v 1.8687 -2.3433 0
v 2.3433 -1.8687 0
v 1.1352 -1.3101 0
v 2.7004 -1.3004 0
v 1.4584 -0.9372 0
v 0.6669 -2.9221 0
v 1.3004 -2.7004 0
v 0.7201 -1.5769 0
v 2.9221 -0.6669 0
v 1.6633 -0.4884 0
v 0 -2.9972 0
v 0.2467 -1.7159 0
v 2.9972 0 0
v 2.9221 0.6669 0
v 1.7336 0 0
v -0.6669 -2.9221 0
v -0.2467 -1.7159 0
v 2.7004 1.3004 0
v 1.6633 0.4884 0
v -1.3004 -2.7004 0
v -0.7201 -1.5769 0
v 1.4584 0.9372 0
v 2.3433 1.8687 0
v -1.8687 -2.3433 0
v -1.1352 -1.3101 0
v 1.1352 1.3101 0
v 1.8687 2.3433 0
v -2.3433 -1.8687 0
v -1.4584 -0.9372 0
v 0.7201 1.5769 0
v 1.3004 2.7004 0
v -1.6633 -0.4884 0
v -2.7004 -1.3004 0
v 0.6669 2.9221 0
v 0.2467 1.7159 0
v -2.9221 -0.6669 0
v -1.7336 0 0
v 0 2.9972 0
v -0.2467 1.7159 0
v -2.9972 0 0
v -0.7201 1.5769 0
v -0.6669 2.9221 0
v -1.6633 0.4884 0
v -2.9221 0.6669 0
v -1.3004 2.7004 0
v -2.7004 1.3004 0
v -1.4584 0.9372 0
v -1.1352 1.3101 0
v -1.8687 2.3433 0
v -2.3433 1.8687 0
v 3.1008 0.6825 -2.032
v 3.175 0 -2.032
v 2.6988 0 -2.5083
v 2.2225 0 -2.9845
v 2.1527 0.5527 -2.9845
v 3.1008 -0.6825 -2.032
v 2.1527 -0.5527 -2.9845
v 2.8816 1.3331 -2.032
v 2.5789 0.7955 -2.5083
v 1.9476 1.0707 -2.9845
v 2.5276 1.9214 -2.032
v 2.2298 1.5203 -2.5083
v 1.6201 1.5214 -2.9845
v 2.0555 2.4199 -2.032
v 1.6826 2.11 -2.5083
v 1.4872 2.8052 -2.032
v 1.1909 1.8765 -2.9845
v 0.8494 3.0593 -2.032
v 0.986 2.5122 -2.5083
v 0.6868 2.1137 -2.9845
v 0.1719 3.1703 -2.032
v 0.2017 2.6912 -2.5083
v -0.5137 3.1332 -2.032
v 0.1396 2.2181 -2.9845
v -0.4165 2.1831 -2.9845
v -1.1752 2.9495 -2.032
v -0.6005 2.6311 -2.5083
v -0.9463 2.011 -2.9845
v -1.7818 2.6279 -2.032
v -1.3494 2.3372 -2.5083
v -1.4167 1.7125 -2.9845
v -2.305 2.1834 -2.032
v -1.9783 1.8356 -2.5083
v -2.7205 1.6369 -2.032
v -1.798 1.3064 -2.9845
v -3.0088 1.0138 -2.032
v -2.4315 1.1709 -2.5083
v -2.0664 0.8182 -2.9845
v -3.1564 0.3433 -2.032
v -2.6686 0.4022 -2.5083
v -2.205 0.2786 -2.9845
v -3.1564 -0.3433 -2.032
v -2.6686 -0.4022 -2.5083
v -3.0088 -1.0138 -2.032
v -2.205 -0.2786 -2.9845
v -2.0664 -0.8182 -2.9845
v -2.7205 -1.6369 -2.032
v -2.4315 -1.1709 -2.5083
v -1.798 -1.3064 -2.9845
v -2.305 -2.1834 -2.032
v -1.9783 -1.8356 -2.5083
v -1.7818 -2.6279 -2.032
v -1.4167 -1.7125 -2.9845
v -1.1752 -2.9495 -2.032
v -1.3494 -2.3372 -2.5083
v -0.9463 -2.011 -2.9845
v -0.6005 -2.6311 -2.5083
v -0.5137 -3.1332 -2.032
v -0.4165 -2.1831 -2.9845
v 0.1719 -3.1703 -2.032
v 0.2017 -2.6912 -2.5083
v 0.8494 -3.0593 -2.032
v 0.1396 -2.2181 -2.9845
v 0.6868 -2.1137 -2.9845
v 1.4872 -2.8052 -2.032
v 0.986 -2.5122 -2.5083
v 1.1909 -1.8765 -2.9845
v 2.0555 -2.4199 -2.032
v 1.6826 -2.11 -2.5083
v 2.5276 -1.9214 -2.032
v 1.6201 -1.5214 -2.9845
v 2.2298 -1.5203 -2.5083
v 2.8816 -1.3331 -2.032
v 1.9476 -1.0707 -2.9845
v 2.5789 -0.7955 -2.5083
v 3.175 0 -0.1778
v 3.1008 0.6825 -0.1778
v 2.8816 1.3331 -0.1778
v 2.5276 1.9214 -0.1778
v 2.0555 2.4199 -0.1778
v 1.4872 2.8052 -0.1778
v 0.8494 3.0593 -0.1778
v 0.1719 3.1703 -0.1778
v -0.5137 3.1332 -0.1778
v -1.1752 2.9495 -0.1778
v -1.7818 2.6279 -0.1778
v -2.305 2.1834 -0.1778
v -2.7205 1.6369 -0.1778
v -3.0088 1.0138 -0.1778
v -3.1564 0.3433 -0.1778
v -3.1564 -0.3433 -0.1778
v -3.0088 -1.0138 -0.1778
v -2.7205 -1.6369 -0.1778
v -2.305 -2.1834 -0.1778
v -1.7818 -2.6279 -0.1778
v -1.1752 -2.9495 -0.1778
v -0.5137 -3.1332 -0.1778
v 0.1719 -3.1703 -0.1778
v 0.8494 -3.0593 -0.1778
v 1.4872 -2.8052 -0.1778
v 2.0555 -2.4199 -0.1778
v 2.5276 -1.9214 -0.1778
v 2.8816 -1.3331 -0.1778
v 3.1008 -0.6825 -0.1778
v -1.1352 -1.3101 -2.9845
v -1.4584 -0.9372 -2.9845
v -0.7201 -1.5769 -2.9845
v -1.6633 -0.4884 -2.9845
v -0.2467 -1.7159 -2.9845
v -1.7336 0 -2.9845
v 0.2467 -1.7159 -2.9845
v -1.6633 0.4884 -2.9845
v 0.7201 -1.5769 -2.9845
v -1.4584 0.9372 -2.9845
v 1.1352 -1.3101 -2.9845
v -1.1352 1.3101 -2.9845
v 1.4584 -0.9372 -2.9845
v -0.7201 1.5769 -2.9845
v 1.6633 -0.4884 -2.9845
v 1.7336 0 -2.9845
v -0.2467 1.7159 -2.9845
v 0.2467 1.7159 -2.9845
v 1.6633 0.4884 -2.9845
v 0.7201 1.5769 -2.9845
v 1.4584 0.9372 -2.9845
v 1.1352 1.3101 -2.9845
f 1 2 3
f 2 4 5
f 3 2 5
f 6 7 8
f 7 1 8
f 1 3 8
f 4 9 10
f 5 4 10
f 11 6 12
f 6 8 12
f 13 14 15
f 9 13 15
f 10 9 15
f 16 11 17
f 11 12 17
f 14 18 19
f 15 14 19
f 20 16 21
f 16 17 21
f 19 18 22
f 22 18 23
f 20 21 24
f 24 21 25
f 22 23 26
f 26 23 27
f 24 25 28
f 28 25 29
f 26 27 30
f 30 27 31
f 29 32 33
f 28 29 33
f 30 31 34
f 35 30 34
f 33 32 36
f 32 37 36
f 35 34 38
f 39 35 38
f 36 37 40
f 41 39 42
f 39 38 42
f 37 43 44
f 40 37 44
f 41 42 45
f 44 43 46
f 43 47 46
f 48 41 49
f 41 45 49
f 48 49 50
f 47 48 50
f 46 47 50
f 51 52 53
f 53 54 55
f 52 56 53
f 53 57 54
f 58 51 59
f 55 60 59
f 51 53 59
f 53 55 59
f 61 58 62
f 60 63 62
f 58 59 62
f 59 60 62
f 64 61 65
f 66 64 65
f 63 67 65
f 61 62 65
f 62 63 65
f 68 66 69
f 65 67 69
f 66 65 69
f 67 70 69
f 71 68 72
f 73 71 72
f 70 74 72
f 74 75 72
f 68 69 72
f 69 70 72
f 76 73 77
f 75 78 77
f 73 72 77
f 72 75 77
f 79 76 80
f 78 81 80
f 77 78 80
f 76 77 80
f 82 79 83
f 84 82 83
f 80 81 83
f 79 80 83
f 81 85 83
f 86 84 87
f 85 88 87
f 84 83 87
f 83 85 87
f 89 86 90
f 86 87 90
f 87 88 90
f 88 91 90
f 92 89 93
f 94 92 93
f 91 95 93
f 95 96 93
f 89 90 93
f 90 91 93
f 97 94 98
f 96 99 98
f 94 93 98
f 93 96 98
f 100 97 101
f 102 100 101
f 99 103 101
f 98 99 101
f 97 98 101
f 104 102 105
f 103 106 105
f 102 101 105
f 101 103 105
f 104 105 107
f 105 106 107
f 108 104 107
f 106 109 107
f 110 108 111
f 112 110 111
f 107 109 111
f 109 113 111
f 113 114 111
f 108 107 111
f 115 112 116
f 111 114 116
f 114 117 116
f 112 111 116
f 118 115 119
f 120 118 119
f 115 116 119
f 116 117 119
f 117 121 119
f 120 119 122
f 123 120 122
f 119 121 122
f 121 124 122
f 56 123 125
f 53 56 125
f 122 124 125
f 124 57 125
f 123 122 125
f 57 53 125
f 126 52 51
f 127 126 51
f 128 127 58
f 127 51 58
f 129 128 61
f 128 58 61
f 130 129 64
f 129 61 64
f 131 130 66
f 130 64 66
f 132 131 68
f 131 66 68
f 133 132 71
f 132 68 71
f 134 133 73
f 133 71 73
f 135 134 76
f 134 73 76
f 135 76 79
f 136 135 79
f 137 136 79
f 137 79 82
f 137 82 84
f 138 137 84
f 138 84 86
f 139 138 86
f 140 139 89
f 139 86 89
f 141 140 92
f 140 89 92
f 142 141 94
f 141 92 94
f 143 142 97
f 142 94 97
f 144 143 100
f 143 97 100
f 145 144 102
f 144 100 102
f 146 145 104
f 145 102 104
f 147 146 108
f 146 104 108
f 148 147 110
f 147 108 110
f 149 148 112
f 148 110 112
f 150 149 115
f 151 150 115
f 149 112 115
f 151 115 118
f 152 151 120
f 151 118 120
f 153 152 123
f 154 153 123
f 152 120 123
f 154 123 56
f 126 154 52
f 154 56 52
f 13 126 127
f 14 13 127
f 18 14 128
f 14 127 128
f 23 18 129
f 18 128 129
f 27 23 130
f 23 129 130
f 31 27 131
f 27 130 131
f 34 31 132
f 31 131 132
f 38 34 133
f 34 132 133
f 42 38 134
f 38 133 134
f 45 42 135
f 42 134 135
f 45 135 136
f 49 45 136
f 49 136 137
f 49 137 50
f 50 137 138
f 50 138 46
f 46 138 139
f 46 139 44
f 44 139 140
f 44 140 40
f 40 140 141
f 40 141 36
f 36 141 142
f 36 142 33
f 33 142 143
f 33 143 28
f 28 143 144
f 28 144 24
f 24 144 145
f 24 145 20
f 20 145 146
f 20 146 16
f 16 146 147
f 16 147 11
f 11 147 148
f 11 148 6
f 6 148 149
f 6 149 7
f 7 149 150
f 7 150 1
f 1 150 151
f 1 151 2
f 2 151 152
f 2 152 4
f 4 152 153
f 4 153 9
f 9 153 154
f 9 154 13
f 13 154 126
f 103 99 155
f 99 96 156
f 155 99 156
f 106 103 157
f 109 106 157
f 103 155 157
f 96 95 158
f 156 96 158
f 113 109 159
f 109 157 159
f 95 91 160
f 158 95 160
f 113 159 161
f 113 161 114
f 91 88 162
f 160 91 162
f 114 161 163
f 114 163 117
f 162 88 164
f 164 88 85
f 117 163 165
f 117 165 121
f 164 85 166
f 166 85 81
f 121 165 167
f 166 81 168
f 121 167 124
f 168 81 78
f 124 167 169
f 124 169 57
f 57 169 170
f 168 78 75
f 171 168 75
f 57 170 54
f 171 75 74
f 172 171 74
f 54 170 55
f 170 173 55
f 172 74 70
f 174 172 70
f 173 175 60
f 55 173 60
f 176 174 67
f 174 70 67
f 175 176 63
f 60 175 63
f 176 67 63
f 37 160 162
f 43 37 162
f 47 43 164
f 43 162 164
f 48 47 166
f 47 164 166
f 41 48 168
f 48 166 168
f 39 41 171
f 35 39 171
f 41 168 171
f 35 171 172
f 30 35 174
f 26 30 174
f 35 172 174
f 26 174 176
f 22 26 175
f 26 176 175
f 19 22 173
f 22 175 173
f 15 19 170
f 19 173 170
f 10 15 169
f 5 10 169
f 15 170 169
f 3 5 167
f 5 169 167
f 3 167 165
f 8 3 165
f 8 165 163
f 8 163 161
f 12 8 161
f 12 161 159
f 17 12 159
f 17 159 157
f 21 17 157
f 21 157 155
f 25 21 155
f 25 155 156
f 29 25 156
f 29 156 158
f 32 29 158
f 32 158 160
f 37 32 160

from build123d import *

# Parameters (mm, degrees)
SKETCH2_R          = 1.73355
CUT_EXTRUDE1_DEPTH = 3.9845
CHAMFER1_SIZE      = 0.1778


with BuildPart() as part:
    # Sketch1 → Revolve1 (revolve)
    with BuildSketch(Plane(origin=(0, 0, 0), x_dir=(1, 0, 0), z_dir=(0, 1, 0))):
        Polygon((0, 0), (3.175, 0), (3.175, 2.032), (2.2225, 2.9845), (0, 2.9845), align=None)
    revolve(axis=Axis((0, 0, 0), (0, 0, 1)))

    # Sketch2 → Cut-Extrude1 (cut, through all)
    with BuildSketch(Plane(origin=(0, 0, -2.9845), x_dir=(-1, 0, 0), z_dir=(0, 0, -1))):
        Circle(SKETCH2_R)
    extrude(amount=-CUT_EXTRUDE1_DEPTH, mode=Mode.SUBTRACT)

    # Chamfer1
    chamfer1_edges = [part.edges().sort_by_distance(p)[0] for p in [
        (-3.175, 0, 0),
    ]]
    chamfer(chamfer1_edges, length=CHAMFER1_SIZE)


solid = part.part
